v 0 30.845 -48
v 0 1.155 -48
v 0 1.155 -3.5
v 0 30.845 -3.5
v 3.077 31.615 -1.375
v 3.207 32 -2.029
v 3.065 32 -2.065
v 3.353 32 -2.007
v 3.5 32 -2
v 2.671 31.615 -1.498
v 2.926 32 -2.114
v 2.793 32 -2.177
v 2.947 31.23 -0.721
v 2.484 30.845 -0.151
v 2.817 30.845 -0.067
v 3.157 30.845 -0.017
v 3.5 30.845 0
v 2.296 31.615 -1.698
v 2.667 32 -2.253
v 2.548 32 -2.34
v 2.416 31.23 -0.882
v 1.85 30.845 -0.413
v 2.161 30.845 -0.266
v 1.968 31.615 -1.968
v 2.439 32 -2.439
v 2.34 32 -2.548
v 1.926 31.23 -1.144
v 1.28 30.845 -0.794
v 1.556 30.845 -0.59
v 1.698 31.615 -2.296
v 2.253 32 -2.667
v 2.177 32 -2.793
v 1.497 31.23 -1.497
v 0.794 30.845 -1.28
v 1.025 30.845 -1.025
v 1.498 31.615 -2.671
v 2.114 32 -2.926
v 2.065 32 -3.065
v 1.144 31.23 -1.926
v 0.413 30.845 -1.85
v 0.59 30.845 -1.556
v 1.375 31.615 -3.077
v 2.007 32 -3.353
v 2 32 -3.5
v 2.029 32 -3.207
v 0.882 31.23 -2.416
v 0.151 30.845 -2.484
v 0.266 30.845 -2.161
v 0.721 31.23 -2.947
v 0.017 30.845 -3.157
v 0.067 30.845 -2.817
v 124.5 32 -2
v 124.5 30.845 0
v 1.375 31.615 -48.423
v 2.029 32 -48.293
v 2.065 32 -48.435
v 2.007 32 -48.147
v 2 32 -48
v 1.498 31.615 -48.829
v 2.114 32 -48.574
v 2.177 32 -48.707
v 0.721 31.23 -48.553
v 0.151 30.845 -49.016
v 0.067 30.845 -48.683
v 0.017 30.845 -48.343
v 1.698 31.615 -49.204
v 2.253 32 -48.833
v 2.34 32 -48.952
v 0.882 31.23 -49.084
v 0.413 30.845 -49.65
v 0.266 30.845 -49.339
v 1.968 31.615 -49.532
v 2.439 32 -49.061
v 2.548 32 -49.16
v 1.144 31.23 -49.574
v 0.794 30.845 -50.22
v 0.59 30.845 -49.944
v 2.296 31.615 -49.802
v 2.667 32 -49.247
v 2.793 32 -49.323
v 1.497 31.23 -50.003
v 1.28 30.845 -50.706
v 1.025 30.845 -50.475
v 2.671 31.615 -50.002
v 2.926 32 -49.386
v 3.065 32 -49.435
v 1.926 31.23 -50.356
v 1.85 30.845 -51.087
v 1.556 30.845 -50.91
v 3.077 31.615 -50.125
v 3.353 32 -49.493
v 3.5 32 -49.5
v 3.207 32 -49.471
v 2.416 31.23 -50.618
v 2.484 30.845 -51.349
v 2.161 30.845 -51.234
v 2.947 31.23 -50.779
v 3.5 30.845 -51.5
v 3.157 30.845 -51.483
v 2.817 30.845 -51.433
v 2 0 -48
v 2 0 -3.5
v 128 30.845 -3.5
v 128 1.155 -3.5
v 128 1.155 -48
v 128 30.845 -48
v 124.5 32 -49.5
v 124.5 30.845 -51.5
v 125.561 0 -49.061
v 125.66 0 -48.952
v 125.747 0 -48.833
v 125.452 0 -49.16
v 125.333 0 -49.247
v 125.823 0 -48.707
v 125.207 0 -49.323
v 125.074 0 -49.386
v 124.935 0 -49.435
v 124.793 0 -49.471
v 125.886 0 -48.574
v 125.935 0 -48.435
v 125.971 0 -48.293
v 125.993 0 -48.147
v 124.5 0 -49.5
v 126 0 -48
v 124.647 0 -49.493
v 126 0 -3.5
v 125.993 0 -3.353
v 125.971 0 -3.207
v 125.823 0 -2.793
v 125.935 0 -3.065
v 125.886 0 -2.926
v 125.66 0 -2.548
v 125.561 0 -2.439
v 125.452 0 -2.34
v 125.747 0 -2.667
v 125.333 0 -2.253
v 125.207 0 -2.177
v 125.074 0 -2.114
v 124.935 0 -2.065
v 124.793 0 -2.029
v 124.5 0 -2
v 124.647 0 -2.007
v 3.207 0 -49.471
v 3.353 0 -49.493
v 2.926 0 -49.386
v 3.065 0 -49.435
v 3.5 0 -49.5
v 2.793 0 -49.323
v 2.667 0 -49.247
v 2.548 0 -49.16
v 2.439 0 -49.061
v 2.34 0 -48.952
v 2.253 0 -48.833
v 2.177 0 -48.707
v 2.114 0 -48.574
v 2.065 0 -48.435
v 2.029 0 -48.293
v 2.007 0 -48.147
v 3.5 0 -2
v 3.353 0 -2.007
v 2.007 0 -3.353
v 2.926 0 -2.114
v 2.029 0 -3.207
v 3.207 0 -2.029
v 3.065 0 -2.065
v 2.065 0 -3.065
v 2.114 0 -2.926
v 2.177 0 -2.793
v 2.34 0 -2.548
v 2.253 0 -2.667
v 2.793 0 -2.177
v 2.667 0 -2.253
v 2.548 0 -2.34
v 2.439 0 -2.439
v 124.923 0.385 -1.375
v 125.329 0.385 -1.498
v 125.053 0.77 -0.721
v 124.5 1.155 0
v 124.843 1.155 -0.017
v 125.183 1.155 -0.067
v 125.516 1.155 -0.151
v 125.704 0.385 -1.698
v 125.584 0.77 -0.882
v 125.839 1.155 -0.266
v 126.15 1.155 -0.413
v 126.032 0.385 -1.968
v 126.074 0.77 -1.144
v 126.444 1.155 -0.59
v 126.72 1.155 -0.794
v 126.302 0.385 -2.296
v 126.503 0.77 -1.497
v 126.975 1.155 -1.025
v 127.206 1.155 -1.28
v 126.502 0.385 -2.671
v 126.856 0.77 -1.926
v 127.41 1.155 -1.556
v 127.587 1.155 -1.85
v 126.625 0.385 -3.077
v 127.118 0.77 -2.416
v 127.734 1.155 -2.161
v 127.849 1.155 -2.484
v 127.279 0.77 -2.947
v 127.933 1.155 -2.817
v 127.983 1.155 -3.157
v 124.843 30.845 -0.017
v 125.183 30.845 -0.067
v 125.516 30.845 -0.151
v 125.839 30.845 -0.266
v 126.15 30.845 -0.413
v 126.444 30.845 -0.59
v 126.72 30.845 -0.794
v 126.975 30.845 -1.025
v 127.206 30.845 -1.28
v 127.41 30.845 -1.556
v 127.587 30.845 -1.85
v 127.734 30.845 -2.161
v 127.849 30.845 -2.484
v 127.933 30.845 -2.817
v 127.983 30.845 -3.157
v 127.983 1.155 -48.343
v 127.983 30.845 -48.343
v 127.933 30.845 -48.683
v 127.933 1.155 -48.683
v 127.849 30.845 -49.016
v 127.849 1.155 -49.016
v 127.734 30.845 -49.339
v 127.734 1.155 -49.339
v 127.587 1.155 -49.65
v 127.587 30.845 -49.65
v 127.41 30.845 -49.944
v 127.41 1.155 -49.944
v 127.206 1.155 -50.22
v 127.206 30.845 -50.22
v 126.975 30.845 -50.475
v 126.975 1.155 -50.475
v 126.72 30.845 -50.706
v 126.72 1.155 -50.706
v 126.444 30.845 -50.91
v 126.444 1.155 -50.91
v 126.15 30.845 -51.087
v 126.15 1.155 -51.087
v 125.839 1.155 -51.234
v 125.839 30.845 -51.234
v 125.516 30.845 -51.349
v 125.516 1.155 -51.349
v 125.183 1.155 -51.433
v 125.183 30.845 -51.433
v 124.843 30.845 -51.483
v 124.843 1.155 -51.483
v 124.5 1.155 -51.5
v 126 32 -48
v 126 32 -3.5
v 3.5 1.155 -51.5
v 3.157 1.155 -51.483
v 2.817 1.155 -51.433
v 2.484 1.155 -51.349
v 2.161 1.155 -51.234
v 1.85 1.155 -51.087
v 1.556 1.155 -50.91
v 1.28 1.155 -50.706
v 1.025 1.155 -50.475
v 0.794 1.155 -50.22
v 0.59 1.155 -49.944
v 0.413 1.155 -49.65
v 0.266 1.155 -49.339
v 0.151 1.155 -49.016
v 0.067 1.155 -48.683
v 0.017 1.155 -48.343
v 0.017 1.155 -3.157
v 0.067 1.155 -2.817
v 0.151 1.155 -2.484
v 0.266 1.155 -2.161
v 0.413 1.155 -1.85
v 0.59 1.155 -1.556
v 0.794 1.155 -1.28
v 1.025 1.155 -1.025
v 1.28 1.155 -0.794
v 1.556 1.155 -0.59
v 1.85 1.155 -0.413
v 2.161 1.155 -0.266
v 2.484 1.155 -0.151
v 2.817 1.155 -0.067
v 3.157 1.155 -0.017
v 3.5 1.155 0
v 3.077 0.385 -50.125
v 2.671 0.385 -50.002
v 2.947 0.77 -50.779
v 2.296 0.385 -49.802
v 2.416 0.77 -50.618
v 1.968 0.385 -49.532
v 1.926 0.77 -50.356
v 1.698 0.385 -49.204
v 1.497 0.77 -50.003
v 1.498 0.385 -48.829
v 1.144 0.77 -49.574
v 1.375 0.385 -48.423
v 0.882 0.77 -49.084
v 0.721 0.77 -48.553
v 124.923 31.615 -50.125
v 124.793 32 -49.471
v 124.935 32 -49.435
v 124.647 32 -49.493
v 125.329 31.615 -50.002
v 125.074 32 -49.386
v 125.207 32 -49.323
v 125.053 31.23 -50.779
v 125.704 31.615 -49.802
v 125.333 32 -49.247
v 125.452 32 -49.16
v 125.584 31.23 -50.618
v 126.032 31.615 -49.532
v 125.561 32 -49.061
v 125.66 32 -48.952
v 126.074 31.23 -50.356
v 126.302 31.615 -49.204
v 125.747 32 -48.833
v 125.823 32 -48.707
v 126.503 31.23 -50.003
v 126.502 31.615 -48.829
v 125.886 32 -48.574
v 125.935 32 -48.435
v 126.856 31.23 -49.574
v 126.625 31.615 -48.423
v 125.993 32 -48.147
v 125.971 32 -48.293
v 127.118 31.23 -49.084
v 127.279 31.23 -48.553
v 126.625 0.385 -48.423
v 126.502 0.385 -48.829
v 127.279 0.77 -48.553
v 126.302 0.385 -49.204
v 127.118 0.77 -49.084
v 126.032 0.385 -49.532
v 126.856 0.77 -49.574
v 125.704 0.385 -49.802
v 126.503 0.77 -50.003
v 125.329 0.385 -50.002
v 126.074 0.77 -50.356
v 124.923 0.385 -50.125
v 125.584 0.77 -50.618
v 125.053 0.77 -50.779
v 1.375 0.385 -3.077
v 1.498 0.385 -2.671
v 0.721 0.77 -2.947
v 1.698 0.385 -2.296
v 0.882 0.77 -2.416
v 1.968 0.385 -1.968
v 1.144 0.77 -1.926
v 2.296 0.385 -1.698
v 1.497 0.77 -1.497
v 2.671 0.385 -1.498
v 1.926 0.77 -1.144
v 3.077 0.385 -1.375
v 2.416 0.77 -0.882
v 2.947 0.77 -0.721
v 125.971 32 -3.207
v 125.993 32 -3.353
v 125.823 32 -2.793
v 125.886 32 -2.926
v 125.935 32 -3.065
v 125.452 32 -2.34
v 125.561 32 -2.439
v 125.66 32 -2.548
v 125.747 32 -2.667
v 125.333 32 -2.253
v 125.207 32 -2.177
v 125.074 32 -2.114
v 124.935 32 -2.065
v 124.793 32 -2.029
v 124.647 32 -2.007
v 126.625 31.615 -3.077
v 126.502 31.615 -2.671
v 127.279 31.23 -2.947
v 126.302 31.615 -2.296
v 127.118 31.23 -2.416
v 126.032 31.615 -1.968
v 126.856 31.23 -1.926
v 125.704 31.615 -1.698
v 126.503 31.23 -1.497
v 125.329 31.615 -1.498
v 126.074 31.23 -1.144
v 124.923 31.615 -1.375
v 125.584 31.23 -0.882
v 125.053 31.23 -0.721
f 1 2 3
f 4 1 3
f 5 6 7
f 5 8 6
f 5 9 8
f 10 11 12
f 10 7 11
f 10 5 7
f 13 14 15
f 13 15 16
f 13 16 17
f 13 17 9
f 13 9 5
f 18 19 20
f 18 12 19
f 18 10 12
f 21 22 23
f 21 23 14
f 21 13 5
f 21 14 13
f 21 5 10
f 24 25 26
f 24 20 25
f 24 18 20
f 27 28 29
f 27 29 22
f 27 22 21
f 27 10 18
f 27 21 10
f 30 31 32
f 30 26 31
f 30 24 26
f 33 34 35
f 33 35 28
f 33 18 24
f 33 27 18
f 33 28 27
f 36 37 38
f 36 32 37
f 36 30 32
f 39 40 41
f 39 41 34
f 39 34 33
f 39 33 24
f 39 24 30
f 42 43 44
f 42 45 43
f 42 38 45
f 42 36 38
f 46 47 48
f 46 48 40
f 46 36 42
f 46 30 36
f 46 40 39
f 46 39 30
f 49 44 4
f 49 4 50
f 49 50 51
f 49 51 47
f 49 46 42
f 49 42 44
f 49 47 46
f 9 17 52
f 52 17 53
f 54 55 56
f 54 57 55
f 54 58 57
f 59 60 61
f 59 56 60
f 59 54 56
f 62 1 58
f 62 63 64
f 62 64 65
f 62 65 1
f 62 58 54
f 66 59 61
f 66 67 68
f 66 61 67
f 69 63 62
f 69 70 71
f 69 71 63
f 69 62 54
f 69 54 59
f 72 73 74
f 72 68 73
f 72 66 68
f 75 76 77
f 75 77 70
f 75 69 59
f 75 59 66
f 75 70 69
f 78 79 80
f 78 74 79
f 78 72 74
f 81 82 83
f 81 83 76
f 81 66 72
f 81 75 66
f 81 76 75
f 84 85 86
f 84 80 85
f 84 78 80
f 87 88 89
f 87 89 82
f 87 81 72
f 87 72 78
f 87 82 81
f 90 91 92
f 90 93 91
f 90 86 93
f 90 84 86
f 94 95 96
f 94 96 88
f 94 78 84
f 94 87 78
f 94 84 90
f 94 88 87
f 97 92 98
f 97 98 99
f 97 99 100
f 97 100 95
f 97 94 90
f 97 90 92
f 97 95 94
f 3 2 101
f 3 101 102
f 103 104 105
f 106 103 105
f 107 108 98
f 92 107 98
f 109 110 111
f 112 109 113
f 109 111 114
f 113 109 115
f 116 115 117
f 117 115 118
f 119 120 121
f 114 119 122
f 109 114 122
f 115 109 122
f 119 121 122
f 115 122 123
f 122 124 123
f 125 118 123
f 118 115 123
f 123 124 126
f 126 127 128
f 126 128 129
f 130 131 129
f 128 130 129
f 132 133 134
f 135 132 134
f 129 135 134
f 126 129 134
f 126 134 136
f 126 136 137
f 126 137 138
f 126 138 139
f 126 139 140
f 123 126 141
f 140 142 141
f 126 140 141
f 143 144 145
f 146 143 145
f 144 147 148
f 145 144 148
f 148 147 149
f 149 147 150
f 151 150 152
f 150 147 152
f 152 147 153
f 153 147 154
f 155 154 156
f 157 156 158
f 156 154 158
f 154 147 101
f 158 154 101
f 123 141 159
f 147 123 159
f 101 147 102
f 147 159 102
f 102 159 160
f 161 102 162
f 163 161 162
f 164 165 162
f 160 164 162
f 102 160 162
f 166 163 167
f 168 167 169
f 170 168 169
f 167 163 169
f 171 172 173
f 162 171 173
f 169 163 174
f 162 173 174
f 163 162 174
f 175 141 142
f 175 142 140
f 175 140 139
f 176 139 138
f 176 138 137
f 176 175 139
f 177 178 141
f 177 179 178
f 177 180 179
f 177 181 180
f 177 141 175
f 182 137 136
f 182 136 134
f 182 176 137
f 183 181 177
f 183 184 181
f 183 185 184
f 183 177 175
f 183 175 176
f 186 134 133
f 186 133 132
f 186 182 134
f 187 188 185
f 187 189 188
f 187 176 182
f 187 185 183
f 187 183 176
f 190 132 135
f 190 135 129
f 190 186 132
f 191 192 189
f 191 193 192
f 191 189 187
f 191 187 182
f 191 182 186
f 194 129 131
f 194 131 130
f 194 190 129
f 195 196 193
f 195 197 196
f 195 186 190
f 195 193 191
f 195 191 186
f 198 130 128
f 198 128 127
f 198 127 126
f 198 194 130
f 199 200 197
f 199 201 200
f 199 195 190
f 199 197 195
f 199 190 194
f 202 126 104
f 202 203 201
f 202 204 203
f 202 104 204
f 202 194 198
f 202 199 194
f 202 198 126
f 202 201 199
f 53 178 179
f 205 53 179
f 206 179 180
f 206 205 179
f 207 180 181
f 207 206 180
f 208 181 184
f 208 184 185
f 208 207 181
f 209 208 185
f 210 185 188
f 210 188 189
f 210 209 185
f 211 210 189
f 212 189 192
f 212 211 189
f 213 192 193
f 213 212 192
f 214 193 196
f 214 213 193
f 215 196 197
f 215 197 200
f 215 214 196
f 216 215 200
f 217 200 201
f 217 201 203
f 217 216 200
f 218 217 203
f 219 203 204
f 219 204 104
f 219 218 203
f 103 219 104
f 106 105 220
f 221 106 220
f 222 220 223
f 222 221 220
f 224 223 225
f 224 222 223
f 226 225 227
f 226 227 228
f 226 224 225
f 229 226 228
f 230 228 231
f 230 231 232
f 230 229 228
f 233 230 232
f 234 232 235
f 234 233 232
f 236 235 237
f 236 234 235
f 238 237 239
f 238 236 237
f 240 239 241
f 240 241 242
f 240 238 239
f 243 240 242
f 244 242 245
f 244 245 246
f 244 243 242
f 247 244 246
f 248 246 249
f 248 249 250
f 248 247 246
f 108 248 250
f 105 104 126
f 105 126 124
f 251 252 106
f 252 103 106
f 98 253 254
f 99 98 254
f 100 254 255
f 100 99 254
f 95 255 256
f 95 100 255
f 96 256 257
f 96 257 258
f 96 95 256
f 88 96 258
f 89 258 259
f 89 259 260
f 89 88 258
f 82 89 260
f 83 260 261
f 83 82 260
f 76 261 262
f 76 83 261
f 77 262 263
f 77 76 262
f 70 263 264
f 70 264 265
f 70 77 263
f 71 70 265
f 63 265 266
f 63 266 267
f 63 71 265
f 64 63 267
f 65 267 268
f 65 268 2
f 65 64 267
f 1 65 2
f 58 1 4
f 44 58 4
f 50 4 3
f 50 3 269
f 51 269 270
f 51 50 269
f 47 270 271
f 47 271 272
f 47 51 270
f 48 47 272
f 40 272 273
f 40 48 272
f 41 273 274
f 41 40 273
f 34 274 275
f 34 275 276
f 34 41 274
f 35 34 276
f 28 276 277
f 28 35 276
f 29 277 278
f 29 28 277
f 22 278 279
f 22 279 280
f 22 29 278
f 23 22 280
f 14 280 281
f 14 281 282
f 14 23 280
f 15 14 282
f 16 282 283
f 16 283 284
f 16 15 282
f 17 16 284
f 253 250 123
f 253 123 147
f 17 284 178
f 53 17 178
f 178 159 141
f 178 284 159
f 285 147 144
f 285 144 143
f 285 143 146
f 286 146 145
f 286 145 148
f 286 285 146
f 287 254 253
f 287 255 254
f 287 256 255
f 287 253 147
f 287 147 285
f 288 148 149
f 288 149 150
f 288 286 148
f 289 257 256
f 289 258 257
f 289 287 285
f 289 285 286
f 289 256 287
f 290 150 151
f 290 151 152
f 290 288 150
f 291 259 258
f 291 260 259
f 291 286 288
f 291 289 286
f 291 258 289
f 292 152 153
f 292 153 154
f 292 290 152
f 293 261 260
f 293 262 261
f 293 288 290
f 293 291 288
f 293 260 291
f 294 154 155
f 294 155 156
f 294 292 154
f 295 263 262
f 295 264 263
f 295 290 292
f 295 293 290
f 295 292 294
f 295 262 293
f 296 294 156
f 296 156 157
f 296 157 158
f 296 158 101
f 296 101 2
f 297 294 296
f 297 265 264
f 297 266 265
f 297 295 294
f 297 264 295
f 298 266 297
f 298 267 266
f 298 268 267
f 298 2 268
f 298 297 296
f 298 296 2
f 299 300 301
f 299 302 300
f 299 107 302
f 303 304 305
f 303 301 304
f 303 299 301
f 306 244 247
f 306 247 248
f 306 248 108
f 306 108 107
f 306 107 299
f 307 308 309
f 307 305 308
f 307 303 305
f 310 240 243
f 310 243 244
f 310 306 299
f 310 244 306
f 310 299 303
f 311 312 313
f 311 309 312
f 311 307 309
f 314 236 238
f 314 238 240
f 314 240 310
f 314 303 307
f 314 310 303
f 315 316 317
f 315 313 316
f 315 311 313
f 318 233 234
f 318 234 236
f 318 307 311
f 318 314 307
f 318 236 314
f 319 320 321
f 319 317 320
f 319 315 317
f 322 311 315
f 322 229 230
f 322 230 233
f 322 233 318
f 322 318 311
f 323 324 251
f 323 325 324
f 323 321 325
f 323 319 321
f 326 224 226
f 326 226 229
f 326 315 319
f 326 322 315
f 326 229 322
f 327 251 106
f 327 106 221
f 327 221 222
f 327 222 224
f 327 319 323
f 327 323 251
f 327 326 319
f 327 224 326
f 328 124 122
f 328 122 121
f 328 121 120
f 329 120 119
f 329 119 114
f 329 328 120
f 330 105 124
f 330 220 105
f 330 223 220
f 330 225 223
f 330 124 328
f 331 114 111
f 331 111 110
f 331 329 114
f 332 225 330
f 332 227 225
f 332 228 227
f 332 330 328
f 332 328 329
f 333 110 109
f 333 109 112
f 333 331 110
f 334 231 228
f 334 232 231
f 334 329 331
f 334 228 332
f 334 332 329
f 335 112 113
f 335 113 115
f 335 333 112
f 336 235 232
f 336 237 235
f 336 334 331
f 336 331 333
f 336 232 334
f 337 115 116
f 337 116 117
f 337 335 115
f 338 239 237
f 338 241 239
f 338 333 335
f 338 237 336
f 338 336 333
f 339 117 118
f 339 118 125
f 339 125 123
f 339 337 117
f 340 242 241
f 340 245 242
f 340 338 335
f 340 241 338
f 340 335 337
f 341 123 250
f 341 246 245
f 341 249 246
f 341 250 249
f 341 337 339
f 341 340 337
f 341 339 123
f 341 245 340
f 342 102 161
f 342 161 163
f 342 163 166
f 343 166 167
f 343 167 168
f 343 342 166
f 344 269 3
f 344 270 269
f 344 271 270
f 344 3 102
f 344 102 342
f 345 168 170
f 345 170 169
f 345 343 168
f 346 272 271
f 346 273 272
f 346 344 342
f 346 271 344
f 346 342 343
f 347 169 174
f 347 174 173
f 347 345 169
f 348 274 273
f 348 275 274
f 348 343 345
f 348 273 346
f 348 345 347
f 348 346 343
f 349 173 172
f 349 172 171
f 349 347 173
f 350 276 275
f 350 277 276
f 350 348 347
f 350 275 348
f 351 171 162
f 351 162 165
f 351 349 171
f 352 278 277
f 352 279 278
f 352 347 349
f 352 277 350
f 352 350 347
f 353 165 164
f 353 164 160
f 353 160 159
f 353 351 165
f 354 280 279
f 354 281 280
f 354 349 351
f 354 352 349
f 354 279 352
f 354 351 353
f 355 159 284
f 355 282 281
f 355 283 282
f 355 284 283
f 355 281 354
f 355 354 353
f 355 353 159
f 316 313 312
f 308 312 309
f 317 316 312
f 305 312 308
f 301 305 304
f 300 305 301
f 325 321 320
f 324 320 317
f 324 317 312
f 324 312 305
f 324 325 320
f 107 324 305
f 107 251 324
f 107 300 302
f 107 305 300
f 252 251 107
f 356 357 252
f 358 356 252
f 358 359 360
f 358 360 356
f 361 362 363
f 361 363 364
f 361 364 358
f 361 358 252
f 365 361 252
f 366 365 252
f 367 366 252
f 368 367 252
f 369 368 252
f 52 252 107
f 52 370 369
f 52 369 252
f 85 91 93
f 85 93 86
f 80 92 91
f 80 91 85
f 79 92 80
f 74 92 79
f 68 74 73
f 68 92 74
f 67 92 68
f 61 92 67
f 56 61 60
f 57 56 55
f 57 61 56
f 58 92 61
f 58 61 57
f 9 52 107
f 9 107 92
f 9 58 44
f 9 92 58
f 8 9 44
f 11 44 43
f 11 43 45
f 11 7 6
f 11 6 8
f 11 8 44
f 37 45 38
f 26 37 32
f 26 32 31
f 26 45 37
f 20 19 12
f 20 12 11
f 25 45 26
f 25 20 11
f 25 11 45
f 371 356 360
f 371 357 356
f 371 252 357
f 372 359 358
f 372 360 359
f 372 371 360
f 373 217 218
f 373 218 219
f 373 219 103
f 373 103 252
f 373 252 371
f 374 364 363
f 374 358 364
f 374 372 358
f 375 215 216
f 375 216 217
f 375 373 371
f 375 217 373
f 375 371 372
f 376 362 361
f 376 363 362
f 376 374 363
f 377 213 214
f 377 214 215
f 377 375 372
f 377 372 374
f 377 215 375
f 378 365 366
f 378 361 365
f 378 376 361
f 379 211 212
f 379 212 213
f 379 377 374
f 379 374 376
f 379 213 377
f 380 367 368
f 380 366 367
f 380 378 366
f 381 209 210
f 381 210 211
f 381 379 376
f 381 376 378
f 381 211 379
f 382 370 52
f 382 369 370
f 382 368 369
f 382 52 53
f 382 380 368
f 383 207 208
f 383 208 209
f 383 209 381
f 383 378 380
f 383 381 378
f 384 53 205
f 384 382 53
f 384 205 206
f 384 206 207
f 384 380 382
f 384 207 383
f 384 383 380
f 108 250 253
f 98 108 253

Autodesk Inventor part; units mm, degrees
ref_plane "YZ Plane" through (0, 0, 0) normal (1, 0, 0) x (0, 1, 0)
ref_plane "XZ Plane" through (0, 0, 0) normal (0, 1, 0) x (-1, 0, 0)
ref_plane "XY Plane" through (0, 0, 0) normal (0, 0, 1) x (1, 0, 0)
sketch "Sketch1" plane through (0, 0, 0) normal (0, 1, 0) x (-1, 0, 0)
  line L0 (0, 0) -> (-128, 0)
  line L1 (-128, 0) -> (-128, -51.5)
  line L2 (-128, -51.5) -> (0, -51.5)
  line L3 (0, -51.5) -> (0, 0)
  dimension "d0" = 128
  dimension "d1" = 51.5
extrude "Extrusion1" add sketch "Sketch1" along normal blind 32
fillet "Fillet1" radius 3.5 4 edges at (128, 16, 0) (128, 16, -51.5) (0, 16, 0) (0, 16, -51.5)
chamfer "Chamfer1" distance 2 angle 30 4 edges at (64, 32, 0) (0, 32, -25.75) (64, 32, -51.5) (128, 32, -25.75) measured on face at (43.8333, 32, -34.3333)
chamfer "Chamfer2" distance 2 angle 30 4 edges at (64, 0, 0) (128, 0, -25.75) (64, 0, -51.5) (0, 0, -25.75) measured on face at (43.8333, 0, -34.3333)
properties part number "PS-24 PSU" material "PC/ABS Plastic"
